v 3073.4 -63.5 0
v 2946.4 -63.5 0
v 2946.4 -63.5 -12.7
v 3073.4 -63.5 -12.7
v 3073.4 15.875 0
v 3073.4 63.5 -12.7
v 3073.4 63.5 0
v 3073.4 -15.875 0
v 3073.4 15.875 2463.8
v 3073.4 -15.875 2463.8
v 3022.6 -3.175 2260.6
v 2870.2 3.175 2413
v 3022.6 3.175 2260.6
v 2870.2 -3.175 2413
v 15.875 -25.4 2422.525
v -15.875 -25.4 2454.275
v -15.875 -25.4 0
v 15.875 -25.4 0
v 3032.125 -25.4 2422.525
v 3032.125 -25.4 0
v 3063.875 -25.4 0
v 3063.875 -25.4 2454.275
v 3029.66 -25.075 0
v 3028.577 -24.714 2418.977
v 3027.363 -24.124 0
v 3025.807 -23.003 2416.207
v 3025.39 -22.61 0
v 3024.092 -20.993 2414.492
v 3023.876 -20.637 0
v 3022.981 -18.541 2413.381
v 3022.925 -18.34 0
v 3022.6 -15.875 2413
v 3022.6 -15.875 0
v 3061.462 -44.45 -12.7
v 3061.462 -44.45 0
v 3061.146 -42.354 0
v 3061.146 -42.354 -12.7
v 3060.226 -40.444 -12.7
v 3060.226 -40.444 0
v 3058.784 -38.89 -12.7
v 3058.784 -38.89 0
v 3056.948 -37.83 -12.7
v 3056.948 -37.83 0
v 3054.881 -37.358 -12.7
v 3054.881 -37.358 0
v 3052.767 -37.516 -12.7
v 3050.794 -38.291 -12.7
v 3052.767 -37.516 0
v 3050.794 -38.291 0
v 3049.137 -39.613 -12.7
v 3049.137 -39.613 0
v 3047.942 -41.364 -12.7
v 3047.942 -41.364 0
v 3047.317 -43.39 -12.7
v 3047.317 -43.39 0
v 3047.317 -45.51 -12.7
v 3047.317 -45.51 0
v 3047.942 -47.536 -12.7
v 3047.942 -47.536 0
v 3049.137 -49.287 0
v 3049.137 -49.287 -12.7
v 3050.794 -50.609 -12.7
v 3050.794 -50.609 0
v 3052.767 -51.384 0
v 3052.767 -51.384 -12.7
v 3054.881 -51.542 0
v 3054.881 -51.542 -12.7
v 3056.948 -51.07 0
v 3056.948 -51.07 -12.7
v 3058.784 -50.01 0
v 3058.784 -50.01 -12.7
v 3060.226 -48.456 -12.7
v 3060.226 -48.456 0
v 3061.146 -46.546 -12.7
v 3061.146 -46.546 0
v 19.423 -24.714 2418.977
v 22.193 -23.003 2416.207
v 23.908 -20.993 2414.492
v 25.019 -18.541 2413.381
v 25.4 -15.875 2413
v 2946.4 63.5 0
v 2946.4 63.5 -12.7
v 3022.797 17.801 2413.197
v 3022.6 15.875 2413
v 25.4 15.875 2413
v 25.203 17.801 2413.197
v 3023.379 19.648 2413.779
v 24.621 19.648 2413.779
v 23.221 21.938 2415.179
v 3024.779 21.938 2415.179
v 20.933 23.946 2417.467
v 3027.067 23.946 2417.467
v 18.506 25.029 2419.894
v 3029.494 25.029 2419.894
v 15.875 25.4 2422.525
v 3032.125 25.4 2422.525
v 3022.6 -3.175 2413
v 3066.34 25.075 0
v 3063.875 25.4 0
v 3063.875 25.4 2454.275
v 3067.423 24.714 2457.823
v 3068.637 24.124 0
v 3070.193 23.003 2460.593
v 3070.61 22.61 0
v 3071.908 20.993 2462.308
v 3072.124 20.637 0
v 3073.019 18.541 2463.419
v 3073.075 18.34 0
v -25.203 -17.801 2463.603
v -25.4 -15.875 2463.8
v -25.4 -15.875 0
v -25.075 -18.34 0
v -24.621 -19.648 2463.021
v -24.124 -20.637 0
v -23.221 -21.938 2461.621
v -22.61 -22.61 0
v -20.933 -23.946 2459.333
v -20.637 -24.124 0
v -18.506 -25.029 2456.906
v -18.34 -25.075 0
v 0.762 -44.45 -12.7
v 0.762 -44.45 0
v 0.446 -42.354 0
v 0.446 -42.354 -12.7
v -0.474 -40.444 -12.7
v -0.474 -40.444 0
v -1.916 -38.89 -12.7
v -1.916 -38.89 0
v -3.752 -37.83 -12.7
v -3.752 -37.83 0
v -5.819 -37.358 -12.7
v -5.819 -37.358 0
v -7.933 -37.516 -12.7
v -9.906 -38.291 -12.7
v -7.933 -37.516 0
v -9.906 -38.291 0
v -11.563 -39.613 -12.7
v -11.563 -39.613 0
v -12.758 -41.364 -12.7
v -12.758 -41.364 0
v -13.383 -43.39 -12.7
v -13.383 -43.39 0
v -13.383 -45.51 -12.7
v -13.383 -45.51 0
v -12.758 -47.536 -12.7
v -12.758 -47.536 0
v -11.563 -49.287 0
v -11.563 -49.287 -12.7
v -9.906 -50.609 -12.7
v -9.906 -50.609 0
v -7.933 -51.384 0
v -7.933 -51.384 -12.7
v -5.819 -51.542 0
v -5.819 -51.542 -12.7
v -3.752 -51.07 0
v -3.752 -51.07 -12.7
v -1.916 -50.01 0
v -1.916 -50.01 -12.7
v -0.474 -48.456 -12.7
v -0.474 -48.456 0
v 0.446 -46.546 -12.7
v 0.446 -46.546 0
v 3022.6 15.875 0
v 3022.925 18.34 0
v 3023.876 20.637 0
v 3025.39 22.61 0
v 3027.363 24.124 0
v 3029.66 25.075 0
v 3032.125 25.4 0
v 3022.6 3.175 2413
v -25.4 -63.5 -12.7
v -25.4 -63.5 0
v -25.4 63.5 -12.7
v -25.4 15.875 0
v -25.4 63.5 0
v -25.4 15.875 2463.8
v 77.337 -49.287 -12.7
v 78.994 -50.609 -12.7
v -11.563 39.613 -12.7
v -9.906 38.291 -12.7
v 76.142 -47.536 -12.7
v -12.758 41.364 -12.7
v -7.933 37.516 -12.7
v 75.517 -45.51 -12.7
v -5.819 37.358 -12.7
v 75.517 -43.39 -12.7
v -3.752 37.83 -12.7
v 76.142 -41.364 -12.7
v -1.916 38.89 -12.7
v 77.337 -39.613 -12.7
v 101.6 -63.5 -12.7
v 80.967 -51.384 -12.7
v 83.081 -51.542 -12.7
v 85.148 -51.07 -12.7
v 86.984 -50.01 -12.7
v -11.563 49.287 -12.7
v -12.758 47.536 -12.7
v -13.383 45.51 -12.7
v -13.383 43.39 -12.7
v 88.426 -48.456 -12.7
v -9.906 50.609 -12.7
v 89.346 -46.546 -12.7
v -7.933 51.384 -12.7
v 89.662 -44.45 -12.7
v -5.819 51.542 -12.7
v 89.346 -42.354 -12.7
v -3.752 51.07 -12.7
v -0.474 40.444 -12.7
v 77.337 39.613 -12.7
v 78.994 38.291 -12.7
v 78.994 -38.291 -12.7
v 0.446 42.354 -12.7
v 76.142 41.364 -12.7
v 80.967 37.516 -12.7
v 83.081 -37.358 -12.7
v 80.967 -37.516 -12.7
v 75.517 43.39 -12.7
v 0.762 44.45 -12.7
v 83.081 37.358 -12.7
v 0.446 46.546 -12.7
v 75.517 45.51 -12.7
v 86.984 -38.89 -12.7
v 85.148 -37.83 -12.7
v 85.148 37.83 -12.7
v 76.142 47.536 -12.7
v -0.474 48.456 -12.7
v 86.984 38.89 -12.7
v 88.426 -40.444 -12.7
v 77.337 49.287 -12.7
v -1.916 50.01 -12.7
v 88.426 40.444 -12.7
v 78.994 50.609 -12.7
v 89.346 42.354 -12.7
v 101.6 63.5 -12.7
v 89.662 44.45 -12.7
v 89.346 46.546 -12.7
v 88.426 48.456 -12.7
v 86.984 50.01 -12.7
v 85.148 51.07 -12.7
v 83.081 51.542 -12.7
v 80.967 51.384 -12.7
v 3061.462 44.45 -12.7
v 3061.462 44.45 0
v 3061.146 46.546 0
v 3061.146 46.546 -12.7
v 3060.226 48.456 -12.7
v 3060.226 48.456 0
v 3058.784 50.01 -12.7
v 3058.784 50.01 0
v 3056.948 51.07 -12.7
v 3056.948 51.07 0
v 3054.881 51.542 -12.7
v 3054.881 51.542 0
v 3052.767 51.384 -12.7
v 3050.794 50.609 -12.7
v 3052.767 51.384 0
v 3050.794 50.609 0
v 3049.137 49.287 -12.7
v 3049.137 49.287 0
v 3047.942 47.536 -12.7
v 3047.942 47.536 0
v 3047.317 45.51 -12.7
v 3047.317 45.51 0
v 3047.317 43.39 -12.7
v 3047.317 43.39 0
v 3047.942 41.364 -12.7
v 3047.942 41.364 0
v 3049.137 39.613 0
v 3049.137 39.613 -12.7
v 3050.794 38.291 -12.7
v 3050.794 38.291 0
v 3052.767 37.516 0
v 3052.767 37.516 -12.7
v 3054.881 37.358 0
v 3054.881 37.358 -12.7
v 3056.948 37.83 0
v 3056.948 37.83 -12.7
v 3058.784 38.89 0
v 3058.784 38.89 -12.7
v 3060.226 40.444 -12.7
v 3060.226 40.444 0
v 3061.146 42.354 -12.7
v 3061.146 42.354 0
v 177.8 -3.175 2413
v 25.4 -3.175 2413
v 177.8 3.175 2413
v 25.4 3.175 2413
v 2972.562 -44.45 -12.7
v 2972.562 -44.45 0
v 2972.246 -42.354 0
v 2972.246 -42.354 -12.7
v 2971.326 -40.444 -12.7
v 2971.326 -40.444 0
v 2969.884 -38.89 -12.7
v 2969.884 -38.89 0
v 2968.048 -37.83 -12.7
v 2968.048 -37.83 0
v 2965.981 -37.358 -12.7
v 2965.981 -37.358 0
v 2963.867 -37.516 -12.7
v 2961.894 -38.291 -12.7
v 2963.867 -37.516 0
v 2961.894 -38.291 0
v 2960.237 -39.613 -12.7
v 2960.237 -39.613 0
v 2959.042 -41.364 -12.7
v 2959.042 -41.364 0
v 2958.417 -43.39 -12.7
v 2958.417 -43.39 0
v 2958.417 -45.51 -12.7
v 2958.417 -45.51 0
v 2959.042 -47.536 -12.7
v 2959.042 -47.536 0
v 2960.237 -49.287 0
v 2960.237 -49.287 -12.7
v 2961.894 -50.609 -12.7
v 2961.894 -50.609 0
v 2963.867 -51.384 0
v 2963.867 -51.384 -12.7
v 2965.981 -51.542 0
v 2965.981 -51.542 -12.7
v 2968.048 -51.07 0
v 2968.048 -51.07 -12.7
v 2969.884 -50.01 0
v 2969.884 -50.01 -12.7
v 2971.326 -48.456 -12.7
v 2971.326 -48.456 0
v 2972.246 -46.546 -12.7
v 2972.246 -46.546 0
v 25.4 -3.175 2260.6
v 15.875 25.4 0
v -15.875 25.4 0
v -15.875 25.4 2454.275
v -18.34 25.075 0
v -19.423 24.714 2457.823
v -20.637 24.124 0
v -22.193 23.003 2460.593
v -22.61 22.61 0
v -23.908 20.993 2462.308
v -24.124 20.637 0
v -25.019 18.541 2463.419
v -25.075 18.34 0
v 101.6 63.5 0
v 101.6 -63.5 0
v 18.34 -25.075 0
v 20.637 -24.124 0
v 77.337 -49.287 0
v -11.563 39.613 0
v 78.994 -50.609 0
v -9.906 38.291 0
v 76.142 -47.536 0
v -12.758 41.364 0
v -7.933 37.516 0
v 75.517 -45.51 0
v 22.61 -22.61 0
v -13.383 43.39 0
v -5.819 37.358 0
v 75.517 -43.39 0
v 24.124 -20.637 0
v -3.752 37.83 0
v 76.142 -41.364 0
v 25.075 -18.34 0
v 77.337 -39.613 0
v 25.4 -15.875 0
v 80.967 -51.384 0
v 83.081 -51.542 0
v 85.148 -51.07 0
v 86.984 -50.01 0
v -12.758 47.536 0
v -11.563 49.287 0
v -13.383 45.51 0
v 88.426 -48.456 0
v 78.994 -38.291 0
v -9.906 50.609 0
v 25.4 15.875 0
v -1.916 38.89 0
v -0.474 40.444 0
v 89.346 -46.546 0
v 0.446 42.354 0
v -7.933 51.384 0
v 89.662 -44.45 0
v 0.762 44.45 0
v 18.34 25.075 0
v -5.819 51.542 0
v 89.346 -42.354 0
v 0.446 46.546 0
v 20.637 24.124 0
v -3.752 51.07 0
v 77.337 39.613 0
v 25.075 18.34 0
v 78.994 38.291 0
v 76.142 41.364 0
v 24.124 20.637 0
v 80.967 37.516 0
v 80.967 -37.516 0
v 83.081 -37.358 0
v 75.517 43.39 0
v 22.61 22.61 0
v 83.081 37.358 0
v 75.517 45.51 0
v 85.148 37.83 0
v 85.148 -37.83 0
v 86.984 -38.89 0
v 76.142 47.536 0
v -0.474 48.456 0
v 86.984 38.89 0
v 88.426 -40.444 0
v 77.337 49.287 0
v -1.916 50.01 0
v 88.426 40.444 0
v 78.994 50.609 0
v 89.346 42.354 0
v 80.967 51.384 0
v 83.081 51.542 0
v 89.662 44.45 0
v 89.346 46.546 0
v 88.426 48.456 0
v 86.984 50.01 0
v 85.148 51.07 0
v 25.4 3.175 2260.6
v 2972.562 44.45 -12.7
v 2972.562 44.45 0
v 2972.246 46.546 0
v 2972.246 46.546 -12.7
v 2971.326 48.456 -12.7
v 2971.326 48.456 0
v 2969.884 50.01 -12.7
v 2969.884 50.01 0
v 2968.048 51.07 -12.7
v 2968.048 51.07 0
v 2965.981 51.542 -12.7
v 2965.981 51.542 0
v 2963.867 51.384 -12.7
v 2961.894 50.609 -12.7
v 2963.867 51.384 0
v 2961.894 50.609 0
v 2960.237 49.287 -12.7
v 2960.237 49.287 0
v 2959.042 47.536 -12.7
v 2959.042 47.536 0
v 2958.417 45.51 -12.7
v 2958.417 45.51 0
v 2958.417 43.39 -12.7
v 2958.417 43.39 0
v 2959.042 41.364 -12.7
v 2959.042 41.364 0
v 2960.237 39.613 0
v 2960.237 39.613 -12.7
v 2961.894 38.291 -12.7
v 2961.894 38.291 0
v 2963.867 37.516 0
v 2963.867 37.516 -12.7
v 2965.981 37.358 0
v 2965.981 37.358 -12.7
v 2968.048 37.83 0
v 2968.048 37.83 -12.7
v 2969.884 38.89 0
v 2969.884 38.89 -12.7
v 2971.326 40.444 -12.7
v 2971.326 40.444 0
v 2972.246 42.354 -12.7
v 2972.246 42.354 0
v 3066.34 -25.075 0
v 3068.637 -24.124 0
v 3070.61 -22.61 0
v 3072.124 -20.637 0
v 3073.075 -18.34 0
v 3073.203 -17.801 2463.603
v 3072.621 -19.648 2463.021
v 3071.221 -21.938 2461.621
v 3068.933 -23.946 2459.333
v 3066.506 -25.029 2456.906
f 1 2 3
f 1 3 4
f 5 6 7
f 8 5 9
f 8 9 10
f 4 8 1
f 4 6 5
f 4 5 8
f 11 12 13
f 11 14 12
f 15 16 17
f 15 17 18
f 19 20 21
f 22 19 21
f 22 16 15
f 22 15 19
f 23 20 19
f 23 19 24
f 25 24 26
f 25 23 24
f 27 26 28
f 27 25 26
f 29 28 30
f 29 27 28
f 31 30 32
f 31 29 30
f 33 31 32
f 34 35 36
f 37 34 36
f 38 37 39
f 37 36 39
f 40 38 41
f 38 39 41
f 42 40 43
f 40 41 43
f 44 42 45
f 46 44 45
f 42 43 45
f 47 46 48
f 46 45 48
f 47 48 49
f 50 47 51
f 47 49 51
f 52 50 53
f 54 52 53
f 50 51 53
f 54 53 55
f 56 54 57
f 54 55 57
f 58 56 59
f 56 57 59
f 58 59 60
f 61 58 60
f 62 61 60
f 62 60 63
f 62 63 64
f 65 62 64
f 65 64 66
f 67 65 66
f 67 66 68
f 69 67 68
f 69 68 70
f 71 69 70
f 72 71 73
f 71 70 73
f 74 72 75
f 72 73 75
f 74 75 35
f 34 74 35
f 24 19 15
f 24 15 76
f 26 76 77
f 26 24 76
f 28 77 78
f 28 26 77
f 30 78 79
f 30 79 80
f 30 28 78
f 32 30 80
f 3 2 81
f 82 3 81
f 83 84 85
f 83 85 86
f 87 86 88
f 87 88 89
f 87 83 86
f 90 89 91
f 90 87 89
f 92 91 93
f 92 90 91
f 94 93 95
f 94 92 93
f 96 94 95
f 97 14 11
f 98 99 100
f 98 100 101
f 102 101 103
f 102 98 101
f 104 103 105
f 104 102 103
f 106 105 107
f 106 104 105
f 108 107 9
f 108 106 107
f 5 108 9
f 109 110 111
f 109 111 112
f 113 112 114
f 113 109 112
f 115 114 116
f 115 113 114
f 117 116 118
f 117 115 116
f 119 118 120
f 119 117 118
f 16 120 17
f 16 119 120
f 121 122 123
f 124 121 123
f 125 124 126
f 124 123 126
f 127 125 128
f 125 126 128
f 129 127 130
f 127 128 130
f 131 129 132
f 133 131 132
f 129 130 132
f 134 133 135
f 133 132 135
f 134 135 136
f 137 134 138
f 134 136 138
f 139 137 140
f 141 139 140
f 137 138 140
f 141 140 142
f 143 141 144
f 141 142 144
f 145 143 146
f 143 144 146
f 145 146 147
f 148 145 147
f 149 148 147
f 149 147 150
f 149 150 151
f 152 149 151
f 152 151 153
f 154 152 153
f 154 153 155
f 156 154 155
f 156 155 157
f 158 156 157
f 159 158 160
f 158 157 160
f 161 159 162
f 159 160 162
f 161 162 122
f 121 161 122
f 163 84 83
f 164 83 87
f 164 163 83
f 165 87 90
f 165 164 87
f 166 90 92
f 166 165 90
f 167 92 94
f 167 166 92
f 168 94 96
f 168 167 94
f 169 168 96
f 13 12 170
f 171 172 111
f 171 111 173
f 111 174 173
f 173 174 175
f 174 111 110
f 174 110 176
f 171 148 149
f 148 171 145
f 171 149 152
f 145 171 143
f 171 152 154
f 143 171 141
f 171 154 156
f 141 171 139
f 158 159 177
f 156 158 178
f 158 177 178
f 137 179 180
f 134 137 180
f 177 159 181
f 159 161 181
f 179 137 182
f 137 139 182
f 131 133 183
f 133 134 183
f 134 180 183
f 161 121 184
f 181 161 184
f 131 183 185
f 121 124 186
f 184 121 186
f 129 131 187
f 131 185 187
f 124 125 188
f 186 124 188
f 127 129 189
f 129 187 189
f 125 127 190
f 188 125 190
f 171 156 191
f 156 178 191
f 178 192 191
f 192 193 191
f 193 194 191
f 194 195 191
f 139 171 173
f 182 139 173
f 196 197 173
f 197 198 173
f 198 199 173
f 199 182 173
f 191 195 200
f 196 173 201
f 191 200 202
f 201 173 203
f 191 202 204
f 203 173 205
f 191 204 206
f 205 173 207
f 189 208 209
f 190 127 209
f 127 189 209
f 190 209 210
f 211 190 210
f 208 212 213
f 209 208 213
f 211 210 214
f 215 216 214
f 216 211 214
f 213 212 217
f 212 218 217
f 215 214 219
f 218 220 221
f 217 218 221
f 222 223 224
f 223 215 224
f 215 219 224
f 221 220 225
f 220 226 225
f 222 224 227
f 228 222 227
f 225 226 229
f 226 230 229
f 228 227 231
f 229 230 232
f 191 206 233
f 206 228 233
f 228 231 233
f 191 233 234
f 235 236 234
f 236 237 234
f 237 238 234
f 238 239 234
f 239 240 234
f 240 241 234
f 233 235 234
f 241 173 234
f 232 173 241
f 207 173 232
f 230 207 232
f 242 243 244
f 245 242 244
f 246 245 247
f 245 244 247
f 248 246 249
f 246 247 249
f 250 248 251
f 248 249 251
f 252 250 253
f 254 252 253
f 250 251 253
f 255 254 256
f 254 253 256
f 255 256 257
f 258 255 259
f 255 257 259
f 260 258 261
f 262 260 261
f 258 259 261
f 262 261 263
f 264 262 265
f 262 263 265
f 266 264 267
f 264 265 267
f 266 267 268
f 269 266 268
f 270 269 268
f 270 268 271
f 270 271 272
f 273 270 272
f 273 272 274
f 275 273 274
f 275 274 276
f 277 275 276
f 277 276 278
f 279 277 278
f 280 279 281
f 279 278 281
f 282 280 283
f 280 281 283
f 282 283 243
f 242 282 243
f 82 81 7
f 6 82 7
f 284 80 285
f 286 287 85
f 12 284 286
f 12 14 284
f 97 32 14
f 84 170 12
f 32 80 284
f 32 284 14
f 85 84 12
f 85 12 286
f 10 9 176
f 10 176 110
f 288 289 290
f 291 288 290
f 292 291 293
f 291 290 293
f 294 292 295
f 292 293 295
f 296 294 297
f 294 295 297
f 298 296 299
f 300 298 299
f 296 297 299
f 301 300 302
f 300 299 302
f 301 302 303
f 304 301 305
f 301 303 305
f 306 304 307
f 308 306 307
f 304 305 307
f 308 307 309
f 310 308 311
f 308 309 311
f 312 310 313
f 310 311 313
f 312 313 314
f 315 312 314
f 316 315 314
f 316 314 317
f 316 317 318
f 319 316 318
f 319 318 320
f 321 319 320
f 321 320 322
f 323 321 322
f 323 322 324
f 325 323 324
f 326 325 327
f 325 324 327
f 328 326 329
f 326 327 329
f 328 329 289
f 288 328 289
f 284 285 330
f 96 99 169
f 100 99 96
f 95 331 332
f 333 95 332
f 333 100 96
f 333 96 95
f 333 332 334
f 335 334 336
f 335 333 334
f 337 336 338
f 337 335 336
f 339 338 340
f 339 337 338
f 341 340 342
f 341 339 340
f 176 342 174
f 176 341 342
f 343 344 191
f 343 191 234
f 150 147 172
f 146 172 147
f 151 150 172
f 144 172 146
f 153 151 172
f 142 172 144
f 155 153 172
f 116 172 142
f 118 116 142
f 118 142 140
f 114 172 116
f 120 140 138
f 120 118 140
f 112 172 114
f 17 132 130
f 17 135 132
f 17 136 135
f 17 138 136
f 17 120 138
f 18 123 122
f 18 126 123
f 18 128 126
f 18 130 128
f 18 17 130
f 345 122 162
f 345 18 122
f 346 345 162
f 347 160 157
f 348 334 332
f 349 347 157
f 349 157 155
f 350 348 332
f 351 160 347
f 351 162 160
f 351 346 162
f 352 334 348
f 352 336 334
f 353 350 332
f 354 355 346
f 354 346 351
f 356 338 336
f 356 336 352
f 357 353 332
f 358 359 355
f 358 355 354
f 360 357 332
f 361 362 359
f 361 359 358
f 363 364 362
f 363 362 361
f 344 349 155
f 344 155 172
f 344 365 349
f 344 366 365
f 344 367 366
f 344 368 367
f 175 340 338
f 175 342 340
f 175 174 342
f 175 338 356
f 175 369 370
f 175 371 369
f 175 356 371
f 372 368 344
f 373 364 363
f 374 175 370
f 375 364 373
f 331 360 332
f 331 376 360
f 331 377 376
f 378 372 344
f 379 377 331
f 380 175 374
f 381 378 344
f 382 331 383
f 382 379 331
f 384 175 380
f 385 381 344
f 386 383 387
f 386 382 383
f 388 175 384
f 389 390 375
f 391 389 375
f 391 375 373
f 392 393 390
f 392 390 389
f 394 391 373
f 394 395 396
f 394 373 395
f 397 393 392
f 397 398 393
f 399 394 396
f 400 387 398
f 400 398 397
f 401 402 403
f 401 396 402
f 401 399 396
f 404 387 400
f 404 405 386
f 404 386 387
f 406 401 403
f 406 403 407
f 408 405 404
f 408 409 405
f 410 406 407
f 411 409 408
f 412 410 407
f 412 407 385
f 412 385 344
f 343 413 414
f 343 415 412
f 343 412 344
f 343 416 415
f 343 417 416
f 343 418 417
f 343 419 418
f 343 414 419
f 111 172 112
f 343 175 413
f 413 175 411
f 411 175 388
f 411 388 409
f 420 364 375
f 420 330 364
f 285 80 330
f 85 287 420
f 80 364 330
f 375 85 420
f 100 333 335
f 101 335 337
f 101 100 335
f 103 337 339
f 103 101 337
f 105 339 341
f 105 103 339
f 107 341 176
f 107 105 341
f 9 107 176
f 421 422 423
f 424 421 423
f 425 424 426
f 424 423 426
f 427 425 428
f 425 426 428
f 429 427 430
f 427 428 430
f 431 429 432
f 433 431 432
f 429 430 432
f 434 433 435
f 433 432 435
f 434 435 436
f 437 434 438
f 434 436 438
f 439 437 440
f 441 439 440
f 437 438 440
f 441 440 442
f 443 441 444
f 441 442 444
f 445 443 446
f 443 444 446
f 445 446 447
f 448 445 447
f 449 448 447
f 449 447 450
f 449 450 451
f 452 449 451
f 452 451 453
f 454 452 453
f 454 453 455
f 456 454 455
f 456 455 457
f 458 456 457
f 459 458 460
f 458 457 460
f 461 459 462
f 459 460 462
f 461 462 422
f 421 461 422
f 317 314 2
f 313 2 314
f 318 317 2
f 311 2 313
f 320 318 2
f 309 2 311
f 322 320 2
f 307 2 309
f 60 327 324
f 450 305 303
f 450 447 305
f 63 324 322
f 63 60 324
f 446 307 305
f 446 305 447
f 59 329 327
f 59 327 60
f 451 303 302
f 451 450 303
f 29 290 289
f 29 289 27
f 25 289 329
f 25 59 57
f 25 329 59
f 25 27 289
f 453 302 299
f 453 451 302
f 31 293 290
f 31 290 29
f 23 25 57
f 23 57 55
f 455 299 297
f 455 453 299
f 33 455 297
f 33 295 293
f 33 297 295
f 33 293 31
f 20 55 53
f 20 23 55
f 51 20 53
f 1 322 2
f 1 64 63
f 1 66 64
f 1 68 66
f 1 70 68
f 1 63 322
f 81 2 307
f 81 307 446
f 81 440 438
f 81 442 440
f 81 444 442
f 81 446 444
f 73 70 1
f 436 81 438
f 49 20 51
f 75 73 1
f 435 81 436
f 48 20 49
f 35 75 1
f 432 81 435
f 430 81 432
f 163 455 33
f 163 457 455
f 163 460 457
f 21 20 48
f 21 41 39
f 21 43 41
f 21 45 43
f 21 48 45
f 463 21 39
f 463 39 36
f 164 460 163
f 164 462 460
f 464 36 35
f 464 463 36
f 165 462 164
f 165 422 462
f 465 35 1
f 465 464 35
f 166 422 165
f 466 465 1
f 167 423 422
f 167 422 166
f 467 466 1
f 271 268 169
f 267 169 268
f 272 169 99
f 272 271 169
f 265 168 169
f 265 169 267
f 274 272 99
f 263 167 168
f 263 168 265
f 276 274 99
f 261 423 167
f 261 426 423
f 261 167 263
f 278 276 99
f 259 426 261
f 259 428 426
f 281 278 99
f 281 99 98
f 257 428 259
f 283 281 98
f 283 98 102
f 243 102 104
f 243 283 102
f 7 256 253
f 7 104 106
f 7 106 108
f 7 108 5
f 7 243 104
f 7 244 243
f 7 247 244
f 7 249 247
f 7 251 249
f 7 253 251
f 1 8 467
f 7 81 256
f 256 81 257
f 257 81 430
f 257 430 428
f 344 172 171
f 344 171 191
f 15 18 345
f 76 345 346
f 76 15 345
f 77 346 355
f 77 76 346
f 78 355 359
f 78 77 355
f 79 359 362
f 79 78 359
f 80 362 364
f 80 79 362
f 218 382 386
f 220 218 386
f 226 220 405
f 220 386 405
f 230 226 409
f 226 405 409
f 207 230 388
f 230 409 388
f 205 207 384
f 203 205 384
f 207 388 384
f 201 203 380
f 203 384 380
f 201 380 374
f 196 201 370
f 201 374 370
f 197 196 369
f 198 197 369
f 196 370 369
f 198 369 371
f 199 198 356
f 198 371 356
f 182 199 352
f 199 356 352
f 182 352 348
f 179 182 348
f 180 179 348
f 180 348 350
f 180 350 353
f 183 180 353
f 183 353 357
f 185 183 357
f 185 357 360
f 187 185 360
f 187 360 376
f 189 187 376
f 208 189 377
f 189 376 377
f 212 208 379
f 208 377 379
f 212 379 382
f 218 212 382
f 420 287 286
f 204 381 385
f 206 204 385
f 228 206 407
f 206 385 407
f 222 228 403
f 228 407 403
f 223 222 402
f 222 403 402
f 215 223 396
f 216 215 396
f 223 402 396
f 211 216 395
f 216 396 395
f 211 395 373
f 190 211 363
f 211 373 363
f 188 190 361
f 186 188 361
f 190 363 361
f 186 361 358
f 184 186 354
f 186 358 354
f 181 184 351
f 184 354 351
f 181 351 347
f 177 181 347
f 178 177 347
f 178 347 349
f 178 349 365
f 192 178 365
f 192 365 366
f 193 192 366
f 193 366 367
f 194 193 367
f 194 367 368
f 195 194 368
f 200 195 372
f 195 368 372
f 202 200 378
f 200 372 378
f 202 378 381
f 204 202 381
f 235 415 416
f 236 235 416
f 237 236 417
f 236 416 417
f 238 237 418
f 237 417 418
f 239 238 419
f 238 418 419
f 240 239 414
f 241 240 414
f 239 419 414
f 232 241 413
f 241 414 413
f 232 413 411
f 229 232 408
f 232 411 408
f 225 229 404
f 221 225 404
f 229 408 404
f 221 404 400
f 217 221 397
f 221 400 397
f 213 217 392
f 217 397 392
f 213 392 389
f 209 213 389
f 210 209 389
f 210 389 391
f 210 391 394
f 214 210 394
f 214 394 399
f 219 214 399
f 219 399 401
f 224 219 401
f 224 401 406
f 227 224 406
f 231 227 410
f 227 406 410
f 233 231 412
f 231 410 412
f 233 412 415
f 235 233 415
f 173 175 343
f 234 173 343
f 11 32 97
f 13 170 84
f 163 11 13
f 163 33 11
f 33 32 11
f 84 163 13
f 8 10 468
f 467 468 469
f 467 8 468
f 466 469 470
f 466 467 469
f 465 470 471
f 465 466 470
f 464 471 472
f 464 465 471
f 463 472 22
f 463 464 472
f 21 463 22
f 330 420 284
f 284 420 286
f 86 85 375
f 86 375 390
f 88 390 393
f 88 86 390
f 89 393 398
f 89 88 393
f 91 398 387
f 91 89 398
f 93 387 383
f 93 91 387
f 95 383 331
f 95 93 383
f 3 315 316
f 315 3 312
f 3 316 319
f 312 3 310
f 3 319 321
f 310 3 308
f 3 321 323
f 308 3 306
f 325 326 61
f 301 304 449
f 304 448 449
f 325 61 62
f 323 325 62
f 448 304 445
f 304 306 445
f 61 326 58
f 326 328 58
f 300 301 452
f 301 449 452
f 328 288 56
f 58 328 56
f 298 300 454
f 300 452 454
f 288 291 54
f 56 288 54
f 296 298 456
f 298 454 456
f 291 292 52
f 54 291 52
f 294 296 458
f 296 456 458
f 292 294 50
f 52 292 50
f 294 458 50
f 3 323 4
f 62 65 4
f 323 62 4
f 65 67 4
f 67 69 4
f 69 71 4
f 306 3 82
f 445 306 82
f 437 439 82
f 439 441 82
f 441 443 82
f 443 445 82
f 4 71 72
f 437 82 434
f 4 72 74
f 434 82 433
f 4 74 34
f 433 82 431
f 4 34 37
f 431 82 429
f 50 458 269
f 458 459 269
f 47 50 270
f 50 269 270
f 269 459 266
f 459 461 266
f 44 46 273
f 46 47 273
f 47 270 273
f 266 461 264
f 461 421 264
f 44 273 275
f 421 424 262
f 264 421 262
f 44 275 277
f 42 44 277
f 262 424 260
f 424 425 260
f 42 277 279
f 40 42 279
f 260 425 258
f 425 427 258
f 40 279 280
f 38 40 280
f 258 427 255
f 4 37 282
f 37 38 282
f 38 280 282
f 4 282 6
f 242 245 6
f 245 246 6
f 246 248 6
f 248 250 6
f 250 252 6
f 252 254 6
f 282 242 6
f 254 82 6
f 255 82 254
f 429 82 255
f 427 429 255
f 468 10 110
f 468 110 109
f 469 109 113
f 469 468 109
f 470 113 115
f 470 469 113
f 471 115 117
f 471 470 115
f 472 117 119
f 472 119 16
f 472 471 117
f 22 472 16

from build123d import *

# Parameters (mm, degrees)
F3_W     = 127
F3_H     = 127
F3_R     = 7.112
F4_DEPTH = 12.7
F6_DEPTH = 3.175


with BuildPart() as f2:
    # F2: sweep along a path in F0
    with BuildLine(Plane.XZ) as f2_path:
        Line((0, 0), (0, 2438.4))
        Line((0, 2438.4), (3048, 2438.4))
        Line((3048, 2438.4), (3048, 0))
    # F1 (on Top) → F2 (sweep)
    with BuildSketch(Plane.XY):
        with BuildLine():
            Line((15.875, 25.4), (-15.875, 25.4))
            ThreePointArc((-15.875, 25.4), (-22.6101920908, 22.6101920908), (-25.4, 15.875))
            Line((-25.4, 15.875), (-25.4, -15.875))
            ThreePointArc((-25.4, -15.875), (-22.6101920908, -22.6101920908), (-15.875, -25.4))
            Line((-15.875, -25.4), (15.875, -25.4))
            ThreePointArc((15.875, -25.4), (22.6101920908, -22.6101920908), (25.4, -15.875))
            Line((25.4, -15.875), (25.4, 15.875))
            ThreePointArc((25.4, 15.875), (22.6101920908, 22.6101920908), (15.875, 25.4))
        make_face()
    sweep(path=f2_path.line, transition=Transition.RIGHT)

    # F3 (on Top) → F4 (join)
    with BuildSketch(Plane.XY):
        with Locations((38.1, 0)):
            Rectangle(F3_W, F3_H)
        with Locations((-6.35, -44.45)):
            Circle(F3_R, mode=Mode.SUBTRACT)
        with Locations((82.55, -44.45)):
            Circle(F3_R, mode=Mode.SUBTRACT)
        with Locations((-6.35, 44.45)):
            Circle(F3_R, mode=Mode.SUBTRACT)
        with Locations((82.55, 44.45)):
            Circle(F3_R, mode=Mode.SUBTRACT)
        with Locations((3009.9, 0)):
            Rectangle(F3_W, F3_H)
        with Locations((2965.45, -44.45)):
            Circle(F3_R, mode=Mode.SUBTRACT)
        with Locations((3054.35, -44.45)):
            Circle(F3_R, mode=Mode.SUBTRACT)
        with Locations((2965.45, 44.45)):
            Circle(F3_R, mode=Mode.SUBTRACT)
        with Locations((3054.35, 44.45)):
            Circle(F3_R, mode=Mode.SUBTRACT)
    extrude(amount=-F4_DEPTH)

    # F5 (on Front) → F6 (join, symmetric)
    with BuildSketch(Plane.XZ):
        Polygon((177.8, 2413), (25.4, 2413), (25.4, 2260.6), align=None)
        Polygon((3022.6, 2260.6), (3022.6, 2413), (2870.2, 2413), align=None)
    extrude(amount=F6_DEPTH, both=True)


solid = f2.part
